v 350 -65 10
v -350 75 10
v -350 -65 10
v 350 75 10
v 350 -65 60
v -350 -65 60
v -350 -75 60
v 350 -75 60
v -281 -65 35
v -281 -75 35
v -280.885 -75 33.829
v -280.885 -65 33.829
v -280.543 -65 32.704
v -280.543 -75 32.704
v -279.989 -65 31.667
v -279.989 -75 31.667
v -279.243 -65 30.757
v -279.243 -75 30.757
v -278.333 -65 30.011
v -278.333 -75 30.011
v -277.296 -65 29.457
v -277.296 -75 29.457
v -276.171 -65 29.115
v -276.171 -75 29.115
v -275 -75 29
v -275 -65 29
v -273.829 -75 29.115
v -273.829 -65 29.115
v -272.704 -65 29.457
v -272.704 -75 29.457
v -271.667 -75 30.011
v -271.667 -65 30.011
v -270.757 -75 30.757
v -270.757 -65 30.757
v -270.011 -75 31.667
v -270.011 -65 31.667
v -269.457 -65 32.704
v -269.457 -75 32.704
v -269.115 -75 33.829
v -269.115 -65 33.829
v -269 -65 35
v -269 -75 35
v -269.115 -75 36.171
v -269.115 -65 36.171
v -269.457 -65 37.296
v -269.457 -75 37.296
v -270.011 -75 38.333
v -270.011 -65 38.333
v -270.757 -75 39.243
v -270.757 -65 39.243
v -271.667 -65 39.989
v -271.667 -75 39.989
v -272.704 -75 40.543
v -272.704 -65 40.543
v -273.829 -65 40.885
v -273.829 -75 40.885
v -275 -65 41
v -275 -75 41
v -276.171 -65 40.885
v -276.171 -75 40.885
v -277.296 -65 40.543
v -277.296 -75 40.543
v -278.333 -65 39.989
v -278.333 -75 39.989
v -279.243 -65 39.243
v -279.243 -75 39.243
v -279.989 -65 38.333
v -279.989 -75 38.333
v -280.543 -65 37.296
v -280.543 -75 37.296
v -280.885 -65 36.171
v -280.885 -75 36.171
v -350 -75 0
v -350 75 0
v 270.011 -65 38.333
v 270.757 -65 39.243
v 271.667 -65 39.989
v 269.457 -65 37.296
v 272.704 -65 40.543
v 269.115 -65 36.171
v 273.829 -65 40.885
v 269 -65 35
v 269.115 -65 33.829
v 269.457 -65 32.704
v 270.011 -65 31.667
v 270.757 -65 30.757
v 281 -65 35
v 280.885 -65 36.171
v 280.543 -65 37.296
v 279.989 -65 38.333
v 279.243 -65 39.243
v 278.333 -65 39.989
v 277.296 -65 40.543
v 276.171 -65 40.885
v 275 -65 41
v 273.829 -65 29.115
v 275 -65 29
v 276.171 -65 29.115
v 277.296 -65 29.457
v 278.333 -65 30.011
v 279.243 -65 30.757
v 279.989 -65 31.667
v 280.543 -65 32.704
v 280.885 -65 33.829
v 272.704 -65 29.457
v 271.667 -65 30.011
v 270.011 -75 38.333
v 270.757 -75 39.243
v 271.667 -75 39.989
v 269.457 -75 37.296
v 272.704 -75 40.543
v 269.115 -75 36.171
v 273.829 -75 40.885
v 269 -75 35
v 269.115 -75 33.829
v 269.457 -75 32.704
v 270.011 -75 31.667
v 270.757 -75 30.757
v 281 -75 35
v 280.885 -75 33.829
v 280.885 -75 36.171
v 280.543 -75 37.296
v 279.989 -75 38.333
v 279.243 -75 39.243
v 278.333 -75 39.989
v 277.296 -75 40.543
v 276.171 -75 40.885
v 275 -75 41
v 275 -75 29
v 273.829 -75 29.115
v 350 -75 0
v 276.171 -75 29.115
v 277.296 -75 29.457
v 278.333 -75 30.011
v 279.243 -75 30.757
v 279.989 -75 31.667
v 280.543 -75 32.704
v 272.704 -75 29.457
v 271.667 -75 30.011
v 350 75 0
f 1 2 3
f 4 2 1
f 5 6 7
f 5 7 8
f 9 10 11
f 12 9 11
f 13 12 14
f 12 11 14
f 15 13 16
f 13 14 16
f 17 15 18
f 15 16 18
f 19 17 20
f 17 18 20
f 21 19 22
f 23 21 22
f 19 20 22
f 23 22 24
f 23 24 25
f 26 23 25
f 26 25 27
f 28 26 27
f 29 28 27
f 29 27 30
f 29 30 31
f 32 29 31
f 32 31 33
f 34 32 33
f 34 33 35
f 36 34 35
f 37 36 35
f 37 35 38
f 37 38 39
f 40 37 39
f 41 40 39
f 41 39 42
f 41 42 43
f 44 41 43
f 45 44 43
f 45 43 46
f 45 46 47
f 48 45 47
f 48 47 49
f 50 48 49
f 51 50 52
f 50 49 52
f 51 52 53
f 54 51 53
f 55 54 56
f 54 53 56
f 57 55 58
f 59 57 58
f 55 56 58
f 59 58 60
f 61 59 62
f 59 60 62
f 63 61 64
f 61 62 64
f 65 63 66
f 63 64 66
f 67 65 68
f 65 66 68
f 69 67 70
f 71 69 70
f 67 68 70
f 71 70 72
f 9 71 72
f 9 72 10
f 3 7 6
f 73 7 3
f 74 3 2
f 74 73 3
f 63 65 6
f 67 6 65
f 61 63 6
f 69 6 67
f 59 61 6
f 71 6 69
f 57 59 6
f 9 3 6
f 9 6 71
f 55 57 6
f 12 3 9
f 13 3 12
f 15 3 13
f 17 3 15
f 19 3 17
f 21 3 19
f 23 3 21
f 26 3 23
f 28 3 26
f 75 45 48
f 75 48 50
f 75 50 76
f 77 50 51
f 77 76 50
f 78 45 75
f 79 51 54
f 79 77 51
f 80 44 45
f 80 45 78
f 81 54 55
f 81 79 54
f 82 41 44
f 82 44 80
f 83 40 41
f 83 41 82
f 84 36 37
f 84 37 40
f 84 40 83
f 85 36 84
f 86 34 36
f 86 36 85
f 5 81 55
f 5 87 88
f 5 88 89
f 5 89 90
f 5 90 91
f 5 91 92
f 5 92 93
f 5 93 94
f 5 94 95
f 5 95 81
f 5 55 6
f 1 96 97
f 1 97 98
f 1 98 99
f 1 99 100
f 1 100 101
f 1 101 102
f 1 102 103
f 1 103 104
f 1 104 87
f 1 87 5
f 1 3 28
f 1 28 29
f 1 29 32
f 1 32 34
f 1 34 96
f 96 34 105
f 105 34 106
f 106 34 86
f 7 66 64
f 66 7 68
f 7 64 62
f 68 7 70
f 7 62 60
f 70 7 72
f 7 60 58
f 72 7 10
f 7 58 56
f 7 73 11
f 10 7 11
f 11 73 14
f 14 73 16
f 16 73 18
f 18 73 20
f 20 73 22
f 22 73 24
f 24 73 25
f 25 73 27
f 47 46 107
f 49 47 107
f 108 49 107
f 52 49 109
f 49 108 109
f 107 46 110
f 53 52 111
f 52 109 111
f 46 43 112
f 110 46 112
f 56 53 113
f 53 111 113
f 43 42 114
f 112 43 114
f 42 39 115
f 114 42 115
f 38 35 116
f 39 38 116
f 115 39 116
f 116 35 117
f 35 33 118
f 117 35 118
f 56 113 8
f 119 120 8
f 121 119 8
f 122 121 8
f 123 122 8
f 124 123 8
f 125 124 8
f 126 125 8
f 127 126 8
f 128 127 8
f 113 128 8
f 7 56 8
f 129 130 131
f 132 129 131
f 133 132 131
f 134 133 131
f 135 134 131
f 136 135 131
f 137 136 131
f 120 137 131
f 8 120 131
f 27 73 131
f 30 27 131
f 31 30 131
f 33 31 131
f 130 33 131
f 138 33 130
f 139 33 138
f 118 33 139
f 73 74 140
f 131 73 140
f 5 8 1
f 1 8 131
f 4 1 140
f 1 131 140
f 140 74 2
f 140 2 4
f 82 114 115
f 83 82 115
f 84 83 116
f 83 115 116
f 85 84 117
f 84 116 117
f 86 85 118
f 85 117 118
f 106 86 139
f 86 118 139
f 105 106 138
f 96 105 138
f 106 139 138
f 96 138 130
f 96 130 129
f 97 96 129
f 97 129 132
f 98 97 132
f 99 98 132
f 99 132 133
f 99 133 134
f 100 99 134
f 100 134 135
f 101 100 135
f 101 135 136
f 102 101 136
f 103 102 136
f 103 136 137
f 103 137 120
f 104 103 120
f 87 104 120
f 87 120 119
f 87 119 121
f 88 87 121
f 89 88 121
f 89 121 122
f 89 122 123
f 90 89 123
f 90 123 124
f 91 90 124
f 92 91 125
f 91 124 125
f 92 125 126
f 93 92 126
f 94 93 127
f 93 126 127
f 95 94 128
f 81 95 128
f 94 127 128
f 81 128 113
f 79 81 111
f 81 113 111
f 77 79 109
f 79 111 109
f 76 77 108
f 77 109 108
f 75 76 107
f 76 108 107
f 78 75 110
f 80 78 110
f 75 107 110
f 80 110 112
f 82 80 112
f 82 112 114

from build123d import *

# Parameters (mm, degrees)
SZKIC1_W                    = 700
SZKIC1_H                    = 150
DODANIE_WYCI_GNI_CIE1_DEPTH = 10
SZKIC2_W                    = 700
SZKIC2_H                    = 10
DODANIE_WYCI_GNI_CIE2_DEPTH = 50
OTW_R_POD_RUB_M101_D        = 12
SZYK_LINIOWY2_COUNT         = 2
SZYK_LINIOWY2_PITCH         = 550


with BuildPart() as part:
    # Szkic1 → Dodanie-wyciągnięcie1 (new body)
    with BuildSketch(Plane.XY):
        Rectangle(SZKIC1_W, SZKIC1_H)
    extrude(amount=DODANIE_WYCI_GNI_CIE1_DEPTH)

    # Szkic2 → Dodanie-wyciągnięcie2 (add)
    with BuildSketch(Plane.XY.offset(10)):
        with Locations((0, -70)):
            Rectangle(SZKIC2_W, SZKIC2_H)
    extrude(amount=DODANIE_WYCI_GNI_CIE2_DEPTH)

    # Otwór pod śrubę M101 (through all)
    with Locations(Plane(origin=(0, -65, 0), x_dir=(1, 0, 0), z_dir=(0, 1, 0))):
        with Locations((-275, -35)):
            otw_r_pod_rub_m101 = Hole(OTW_R_POD_RUB_M101_D / 2)

    # Szyk liniowy2: Otwór pod śrubę M101 ×2
    with Locations(*[(i * SZYK_LINIOWY2_PITCH, 0, 0) for i in range(1, SZYK_LINIOWY2_COUNT)]):
        add(otw_r_pod_rub_m101, mode=Mode.SUBTRACT)


solid = part.part
